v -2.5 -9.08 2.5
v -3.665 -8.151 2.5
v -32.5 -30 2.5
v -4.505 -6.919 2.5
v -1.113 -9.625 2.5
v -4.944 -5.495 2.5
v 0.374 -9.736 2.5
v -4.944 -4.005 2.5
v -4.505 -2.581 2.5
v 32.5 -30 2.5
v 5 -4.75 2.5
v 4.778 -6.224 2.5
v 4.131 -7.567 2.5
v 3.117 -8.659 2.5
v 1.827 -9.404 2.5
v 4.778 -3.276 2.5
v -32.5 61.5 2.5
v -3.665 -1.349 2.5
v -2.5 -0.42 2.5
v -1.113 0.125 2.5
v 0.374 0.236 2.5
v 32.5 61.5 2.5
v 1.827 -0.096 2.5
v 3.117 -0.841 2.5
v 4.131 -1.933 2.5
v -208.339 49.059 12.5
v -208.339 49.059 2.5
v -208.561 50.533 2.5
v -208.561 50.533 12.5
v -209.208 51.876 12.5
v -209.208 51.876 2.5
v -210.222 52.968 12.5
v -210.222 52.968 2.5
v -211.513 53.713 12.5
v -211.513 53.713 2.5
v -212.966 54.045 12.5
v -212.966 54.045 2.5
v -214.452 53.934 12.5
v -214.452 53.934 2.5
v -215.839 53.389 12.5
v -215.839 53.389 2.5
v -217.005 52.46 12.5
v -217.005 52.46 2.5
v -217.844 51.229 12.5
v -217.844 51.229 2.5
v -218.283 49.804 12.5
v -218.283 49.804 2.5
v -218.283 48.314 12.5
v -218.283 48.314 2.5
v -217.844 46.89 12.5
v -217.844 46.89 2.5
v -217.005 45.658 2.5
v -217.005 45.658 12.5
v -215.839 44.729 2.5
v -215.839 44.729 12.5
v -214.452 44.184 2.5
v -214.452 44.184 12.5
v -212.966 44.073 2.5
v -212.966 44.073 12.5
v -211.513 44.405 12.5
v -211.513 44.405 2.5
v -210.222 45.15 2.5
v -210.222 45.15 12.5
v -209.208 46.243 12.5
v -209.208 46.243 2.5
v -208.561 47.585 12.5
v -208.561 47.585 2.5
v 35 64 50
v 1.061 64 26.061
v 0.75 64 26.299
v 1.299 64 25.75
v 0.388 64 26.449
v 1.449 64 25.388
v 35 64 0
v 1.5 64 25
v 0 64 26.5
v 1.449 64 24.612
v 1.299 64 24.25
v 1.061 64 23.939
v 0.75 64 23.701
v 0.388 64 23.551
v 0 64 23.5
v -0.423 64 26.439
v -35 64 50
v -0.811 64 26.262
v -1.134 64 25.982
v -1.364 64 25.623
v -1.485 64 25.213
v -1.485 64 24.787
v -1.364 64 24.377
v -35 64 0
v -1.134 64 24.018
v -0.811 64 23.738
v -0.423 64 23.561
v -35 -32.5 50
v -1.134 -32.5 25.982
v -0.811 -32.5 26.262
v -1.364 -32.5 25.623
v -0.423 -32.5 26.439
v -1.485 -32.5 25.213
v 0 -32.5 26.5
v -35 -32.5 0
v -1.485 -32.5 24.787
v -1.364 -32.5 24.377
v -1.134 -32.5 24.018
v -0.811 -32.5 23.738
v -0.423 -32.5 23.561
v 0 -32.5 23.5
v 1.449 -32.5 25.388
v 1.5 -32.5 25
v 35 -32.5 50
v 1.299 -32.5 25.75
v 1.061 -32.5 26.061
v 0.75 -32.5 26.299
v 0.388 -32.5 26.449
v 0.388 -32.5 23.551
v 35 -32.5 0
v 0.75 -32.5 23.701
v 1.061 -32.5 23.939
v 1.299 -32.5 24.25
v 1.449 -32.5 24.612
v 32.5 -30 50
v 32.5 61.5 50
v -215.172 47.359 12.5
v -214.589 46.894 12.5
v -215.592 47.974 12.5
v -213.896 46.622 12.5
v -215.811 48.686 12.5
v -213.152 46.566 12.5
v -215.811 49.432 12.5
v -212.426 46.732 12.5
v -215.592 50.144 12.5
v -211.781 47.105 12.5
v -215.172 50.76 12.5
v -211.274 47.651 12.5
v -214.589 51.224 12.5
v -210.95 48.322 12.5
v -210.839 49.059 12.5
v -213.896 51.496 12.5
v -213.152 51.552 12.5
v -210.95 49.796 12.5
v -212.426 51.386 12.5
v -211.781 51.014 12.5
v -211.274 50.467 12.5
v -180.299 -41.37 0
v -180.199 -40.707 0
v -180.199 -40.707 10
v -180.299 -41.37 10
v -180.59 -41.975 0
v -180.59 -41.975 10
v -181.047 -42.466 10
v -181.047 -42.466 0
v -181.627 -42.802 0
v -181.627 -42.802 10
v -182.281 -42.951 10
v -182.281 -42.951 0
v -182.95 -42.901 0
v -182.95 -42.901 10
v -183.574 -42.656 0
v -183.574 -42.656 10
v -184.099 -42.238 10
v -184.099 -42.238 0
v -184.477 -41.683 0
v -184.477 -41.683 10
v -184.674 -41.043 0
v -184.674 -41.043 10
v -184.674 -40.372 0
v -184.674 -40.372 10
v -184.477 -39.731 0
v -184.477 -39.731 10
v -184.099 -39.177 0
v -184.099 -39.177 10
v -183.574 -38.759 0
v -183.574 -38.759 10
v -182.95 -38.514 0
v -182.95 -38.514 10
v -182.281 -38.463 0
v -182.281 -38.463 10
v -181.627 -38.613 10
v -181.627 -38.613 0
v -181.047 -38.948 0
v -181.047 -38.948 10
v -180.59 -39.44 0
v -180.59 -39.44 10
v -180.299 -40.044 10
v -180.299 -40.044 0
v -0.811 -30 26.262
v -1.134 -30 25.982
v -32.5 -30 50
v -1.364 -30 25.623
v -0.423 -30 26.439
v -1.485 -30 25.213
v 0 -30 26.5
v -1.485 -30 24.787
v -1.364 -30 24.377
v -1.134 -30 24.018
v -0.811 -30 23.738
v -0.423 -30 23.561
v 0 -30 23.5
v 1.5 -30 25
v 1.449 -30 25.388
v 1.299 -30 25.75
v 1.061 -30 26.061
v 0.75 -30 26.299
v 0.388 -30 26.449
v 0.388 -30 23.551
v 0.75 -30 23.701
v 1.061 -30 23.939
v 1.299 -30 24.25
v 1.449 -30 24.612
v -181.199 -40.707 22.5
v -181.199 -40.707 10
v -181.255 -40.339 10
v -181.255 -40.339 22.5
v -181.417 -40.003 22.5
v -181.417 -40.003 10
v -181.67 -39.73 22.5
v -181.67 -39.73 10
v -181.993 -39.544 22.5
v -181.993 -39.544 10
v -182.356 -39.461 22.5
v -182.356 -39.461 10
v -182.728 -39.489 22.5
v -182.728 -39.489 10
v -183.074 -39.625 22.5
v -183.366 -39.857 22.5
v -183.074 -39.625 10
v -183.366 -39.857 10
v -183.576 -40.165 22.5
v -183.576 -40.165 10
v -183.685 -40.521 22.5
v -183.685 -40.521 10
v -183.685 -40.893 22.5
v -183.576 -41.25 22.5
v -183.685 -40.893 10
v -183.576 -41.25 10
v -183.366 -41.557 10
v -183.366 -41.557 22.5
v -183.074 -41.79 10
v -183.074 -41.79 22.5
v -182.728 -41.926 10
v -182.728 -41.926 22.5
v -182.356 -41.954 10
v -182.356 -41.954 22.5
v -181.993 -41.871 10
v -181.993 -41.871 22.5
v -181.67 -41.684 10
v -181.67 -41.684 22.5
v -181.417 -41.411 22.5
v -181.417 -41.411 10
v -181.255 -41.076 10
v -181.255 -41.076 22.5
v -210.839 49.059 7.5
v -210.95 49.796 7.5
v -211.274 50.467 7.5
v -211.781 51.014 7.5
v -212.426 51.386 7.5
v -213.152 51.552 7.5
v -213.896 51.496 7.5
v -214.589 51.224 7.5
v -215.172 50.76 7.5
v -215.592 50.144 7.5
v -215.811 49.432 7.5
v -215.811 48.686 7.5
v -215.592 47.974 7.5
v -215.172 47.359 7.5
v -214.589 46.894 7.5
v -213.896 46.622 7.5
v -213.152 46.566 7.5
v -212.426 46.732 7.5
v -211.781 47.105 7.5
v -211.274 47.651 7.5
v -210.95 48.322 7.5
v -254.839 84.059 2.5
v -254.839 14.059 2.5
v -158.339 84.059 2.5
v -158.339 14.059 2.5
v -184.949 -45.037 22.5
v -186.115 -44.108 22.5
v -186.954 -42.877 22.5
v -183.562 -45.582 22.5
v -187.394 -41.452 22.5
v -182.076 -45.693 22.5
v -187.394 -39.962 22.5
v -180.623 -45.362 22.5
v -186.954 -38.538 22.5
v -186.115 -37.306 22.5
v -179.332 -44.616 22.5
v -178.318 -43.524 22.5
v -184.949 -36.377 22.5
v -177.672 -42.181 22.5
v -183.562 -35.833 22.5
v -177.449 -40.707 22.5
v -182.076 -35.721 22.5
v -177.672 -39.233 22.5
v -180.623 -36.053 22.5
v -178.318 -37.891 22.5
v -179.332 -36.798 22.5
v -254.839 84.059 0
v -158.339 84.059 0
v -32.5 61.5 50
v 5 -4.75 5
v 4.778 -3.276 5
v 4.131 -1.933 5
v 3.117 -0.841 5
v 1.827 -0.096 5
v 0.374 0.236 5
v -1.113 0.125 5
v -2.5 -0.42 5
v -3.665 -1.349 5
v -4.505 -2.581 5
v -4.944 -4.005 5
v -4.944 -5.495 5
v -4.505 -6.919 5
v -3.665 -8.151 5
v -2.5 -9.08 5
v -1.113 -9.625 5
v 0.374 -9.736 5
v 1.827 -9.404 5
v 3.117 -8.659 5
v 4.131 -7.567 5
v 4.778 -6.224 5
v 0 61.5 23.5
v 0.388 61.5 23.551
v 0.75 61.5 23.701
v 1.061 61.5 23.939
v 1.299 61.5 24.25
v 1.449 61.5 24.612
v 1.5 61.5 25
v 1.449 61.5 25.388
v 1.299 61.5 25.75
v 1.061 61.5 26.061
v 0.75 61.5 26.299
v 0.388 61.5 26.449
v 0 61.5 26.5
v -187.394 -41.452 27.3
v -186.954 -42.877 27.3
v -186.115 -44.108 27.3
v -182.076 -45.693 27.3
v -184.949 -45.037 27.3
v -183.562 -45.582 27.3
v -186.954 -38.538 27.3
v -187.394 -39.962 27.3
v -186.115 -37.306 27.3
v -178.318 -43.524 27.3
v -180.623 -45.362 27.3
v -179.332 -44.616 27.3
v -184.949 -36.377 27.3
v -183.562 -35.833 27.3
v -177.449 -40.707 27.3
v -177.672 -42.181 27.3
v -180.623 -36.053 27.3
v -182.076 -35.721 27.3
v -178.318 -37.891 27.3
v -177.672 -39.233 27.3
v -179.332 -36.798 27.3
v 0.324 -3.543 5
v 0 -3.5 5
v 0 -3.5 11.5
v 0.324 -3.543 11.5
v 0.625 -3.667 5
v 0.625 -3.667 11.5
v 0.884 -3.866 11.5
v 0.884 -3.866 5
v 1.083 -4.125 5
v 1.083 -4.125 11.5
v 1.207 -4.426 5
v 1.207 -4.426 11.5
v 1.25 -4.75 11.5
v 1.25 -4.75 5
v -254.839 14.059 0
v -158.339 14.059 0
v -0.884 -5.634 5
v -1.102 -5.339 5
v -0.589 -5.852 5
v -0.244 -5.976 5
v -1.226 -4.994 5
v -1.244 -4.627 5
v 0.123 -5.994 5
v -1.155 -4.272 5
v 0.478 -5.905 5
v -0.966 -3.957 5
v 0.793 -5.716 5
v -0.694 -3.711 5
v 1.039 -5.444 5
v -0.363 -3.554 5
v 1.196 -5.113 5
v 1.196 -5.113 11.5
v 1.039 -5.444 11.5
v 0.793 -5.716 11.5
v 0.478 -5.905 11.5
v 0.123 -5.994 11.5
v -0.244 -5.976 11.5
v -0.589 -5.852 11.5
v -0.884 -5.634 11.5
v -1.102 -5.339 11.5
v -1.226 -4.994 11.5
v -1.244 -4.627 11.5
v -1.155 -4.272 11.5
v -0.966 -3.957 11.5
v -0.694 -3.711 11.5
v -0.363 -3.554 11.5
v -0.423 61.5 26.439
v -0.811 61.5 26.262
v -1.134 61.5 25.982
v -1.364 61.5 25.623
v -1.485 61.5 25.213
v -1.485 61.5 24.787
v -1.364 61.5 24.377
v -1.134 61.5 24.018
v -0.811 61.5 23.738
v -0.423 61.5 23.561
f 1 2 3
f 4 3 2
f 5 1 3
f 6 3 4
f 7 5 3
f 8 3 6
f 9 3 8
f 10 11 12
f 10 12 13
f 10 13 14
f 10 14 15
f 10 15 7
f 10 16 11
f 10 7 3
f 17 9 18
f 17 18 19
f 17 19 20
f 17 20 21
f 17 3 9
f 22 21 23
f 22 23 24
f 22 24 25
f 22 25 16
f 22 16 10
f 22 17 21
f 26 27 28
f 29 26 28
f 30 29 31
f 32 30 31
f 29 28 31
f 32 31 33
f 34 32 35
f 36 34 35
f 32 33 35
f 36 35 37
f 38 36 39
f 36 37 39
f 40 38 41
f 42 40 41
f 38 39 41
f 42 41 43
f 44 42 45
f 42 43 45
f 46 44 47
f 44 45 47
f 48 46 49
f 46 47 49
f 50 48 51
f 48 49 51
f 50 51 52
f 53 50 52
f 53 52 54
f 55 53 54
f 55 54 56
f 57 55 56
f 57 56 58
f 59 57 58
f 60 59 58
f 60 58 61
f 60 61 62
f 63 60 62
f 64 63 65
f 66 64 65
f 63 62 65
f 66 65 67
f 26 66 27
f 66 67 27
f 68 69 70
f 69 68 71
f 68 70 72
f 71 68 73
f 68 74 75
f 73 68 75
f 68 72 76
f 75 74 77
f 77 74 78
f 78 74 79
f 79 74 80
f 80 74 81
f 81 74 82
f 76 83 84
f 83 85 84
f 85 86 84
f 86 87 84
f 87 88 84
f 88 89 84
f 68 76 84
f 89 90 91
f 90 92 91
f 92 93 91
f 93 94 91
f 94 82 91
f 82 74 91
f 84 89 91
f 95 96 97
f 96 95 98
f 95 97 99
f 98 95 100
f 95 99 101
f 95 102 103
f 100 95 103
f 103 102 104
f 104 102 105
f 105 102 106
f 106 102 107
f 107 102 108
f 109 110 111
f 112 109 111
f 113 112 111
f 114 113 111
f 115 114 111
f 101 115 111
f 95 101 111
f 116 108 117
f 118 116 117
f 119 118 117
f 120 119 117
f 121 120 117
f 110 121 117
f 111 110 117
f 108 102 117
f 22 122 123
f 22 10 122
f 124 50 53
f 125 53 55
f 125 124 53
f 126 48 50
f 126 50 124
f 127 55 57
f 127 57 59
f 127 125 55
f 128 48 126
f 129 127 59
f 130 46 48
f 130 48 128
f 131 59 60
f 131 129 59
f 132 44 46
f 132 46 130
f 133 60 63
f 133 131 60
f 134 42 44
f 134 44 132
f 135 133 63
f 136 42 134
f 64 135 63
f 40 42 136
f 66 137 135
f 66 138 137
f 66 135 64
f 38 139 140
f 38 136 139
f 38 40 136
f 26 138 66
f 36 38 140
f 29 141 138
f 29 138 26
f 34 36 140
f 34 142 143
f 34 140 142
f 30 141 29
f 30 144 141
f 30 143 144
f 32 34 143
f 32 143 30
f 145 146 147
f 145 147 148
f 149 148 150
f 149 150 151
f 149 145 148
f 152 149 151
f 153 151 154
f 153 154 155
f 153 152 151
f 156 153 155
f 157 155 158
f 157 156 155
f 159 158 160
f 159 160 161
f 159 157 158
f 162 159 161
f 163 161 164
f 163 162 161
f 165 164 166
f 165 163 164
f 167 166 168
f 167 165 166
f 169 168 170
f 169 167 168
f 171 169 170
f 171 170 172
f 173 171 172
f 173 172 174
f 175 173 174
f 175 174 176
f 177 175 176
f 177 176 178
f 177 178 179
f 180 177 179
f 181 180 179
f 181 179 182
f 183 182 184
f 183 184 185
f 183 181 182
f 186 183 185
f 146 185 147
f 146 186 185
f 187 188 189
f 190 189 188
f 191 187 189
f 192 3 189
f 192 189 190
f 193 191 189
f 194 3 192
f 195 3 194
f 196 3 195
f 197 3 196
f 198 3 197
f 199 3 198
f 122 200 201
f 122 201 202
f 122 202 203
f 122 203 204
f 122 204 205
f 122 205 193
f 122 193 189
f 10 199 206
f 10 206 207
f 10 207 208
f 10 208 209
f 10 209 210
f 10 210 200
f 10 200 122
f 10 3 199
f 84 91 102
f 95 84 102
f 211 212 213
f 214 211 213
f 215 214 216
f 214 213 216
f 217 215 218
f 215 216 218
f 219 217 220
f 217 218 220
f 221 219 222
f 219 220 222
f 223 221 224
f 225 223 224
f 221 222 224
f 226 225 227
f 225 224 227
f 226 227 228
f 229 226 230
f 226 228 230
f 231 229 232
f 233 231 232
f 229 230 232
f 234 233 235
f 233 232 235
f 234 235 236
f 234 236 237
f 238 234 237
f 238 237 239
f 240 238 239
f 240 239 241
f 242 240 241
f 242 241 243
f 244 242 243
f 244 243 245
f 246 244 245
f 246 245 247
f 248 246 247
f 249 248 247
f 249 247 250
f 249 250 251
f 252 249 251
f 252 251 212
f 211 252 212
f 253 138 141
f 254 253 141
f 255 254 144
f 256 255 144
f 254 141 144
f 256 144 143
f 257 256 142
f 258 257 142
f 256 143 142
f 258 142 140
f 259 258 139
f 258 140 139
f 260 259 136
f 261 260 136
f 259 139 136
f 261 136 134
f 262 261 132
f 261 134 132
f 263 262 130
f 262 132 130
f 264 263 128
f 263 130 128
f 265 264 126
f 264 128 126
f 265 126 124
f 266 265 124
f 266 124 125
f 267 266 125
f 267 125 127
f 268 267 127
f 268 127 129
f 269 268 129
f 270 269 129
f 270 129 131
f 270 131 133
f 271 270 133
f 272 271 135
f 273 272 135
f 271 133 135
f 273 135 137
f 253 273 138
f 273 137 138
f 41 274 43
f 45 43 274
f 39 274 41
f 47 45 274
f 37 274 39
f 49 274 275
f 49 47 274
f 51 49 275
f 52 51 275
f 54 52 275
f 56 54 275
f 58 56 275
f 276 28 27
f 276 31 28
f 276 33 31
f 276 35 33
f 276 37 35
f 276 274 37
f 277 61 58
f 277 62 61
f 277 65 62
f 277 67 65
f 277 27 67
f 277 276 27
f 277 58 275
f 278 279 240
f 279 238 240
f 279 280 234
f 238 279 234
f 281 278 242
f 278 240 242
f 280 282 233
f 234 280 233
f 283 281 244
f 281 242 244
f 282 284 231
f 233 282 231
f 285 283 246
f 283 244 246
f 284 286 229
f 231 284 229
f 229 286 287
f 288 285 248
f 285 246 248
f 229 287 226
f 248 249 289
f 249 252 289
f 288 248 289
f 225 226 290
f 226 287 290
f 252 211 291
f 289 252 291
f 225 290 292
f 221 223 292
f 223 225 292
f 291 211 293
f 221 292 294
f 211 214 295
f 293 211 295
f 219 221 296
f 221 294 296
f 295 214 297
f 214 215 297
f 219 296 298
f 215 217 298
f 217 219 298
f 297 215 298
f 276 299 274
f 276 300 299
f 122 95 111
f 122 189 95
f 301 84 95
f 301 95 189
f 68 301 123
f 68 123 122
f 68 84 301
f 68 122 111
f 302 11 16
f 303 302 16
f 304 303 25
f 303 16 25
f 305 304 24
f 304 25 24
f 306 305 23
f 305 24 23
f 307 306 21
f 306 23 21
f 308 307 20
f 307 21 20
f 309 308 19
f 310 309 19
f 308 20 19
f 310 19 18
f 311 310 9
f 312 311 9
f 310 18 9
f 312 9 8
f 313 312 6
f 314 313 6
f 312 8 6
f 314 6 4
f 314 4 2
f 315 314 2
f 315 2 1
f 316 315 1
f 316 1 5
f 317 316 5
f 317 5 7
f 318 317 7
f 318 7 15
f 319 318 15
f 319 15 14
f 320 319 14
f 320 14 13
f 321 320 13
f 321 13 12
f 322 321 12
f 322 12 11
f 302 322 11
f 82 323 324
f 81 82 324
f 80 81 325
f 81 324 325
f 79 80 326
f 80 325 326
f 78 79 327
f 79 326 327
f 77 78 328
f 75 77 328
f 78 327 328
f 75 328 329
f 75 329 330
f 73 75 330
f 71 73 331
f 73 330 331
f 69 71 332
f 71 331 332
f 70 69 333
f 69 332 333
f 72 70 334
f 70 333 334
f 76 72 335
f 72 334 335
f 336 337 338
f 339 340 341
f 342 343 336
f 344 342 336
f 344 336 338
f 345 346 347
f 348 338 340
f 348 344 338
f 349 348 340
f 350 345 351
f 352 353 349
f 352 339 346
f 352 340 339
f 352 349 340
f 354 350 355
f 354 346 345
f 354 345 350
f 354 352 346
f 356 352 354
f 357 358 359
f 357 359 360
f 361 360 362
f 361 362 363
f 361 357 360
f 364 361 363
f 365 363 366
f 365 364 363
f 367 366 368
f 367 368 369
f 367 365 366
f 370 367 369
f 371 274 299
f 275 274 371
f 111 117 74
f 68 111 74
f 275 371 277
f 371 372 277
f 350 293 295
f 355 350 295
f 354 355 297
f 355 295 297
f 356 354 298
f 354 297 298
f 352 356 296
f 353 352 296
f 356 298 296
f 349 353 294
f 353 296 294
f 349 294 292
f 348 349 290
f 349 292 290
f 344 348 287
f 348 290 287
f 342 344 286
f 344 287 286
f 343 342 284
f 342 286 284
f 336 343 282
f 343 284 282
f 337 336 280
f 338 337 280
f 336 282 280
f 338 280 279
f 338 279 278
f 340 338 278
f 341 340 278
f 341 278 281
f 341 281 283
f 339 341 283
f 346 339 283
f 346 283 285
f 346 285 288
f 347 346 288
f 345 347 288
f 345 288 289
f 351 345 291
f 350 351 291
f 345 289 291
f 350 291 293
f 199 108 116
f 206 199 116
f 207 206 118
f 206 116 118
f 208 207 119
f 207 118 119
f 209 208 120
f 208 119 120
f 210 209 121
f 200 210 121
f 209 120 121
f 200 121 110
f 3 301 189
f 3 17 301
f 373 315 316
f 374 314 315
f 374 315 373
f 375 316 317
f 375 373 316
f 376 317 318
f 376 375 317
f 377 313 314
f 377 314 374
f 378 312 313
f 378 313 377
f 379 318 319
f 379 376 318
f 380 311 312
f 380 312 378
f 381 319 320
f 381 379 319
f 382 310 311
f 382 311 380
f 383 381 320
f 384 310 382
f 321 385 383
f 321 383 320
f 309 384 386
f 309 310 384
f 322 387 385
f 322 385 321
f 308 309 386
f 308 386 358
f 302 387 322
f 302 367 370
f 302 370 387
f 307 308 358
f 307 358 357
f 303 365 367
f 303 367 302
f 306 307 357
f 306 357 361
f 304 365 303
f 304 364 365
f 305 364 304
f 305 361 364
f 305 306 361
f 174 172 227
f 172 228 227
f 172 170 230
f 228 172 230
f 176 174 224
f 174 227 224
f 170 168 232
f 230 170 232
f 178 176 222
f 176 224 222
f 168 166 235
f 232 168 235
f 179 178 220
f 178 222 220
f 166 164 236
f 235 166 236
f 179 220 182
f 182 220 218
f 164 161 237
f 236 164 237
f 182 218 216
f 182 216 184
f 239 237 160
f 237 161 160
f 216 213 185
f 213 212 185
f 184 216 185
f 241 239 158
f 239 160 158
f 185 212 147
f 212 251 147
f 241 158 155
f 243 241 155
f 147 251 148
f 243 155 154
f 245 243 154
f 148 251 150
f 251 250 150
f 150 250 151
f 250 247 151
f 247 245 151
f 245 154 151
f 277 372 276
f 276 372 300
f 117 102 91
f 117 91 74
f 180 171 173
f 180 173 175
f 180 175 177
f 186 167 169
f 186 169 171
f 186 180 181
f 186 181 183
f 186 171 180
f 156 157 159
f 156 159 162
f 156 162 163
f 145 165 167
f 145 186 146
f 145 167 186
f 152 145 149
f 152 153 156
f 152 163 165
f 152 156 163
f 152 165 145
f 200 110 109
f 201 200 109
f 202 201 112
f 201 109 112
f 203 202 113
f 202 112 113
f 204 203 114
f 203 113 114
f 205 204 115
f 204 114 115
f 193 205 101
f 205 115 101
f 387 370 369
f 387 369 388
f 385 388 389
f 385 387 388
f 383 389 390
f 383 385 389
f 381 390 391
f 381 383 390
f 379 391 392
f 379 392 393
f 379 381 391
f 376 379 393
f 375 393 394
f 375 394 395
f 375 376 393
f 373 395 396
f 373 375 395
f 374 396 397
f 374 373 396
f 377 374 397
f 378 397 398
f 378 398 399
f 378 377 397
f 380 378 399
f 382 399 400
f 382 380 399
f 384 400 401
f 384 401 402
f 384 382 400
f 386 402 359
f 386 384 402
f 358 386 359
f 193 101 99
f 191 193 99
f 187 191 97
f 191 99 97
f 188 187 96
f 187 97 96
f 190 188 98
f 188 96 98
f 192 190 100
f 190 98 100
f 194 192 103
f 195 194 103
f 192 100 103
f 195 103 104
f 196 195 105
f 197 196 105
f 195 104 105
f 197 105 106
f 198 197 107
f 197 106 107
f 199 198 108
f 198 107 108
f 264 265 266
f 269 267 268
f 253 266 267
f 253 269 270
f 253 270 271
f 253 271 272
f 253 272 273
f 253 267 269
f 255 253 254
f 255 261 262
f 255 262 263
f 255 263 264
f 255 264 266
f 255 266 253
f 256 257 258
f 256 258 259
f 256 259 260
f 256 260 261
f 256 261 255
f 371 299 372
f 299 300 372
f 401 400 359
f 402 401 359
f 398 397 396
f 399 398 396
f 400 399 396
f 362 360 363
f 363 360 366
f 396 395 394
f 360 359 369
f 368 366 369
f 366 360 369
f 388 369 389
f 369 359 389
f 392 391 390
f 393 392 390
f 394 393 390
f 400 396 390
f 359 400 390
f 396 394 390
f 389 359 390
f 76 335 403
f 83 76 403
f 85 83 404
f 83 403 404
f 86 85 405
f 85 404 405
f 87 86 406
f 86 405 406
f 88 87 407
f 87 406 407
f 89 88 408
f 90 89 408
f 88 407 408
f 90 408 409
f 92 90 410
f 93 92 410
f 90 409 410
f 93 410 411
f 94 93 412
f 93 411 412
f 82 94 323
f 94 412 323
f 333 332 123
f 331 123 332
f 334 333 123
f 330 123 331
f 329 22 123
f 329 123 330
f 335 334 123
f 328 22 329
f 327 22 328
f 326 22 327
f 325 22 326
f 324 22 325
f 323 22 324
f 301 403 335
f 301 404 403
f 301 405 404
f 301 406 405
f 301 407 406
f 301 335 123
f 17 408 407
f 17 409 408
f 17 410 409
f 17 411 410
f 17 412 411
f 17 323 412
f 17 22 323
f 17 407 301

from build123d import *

# Parameters (mm, degrees)
F1_DEPTH  = 50
F2_T      = -2.5
F4_DEPTH  = 11.5
F5_R      = 5
F6_DEPTH  = 5
F7_W      = 65
F7_H      = 70
F8_DEPTH  = 2.5
F9_R      = 5
F10_DEPTH = 10
F11_R     = 2.5
F12_DEPTH = 5
F13_R     = 1.25
F14_DEPTH = 22.5
F15_R     = 5
F16_DEPTH = 4.8
F17_W     = 70
F17_H     = 2.5
F18_DEPTH = 31.5
F20_DEPTH = 125
F21_R     = 2.25
F21_R_2   = 1.25
F22_DEPTH = 10


with BuildPart() as f1:
    # F0 (on Top) → F1 (new body)
    with BuildSketch(Plane.XY):
        Polygon((-35, -32.5), (35, -32.5), (35, 32.5), (35, 64), (-35, 64), (-35, 32.5), align=None)
    extrude(amount=F1_DEPTH)

    # F2
    f2_openings = [f1.faces().sort_by_distance(p)[0] for p in [
        (0, 15.75, 50),
    ]]
    offset(amount=F2_T, openings=f2_openings)

    # F3 (on face) → F4 (join)
    with BuildSketch(Plane(origin=(0, 0, 0), x_dir=(1, 0, 0), z_dir=(0, 0, -1))):
        with BuildLine():
            ThreePointArc((0, 3.5), (0.8838834765, 3.8661165235), (1.25, 4.75))
            ThreePointArc((1.25, 4.75), (-0.8838834765, 5.6338834765), (0, 3.5))
        make_face()
    extrude(amount=-F4_DEPTH)

    # F5 (on Top) → F6 (join)
    with BuildSketch(Plane.XY):
        with Locations((0, -4.75)):
            Circle(F5_R)
    extrude(amount=F6_DEPTH)

    # F19 (on face) → F20 (cut)
    with BuildSketch(Plane.XZ.offset(32.5)):
        with BuildLine():
            ThreePointArc((1.5, 25), (1.0606601718, 26.0606601718), (0, 26.5))
            Line((0, 26.5), (0, 23.5))
            ThreePointArc((0, 23.5), (1.0606601718, 23.9393398282), (1.5, 25))
        make_face()
        with BuildLine():
            Line((0, 23.5), (0, 26.5))
            ThreePointArc((0, 26.5), (-1.5, 25), (0, 23.5))
        make_face()
    extrude(amount=-F20_DEPTH, mode=Mode.SUBTRACT)


with BuildPart() as f8:
    # F7 (on Top) → F8 (new body)
    with BuildSketch(Plane.XY):
        with Locations((-190.8392894268, 49.0591003001)):
            Rectangle(F7_W, F7_H)
    extrude(amount=F8_DEPTH)

    # F9 (on face) → F10 (join)
    with BuildSketch(Plane.XY.offset(2.5)):
        with Locations((-213.3392894268, 49.0591003001)):
            Circle(F9_R)
    extrude(amount=F10_DEPTH)

    # F11 (on face) → F12 (cut)
    with BuildSketch(Plane.XY.offset(12.5)):
        with Locations((-213.3392894268, 49.0591003001)):
            Circle(F11_R)
    extrude(amount=-F12_DEPTH, mode=Mode.SUBTRACT)

    # F17 (on face) → F18 (join)
    with BuildSketch(Plane(origin=(-223.3392894268, 0, 0), x_dir=(0, -1, 0), z_dir=(-1, 0, 0))):
        with Locations((-49.0591003001, 1.25)):
            Rectangle(F17_W, F17_H)
    extrude(amount=F18_DEPTH)


with BuildPart() as f14:
    # F13 (on Top) → F14 (new body)
    with BuildSketch(Plane.XY):
        with Locations((-182.449400425, -40.7071635127)):
            Circle(F13_R)
    extrude(amount=F14_DEPTH)

    # F15 (on face) → F16 (join)
    with BuildSketch(Plane.XY.offset(22.5)):
        with Locations((-182.449400425, -40.7071635127)):
            Circle(F15_R)
    extrude(amount=F16_DEPTH)

    # F21 (on face) → F22 (join)
    with BuildSketch(Plane(origin=(0, 0, 0), x_dir=(1, 0, 0), z_dir=(0, 0, -1))):
        with Locations((-182.449400425, 40.7071635127)):
            Circle(F21_R)
        with Locations((-182.449400425, 40.7071635127)):
            Circle(F21_R_2, mode=Mode.SUBTRACT)
    extrude(amount=-F22_DEPTH)


solid = Compound([f1.part, f8.part, f14.part])
